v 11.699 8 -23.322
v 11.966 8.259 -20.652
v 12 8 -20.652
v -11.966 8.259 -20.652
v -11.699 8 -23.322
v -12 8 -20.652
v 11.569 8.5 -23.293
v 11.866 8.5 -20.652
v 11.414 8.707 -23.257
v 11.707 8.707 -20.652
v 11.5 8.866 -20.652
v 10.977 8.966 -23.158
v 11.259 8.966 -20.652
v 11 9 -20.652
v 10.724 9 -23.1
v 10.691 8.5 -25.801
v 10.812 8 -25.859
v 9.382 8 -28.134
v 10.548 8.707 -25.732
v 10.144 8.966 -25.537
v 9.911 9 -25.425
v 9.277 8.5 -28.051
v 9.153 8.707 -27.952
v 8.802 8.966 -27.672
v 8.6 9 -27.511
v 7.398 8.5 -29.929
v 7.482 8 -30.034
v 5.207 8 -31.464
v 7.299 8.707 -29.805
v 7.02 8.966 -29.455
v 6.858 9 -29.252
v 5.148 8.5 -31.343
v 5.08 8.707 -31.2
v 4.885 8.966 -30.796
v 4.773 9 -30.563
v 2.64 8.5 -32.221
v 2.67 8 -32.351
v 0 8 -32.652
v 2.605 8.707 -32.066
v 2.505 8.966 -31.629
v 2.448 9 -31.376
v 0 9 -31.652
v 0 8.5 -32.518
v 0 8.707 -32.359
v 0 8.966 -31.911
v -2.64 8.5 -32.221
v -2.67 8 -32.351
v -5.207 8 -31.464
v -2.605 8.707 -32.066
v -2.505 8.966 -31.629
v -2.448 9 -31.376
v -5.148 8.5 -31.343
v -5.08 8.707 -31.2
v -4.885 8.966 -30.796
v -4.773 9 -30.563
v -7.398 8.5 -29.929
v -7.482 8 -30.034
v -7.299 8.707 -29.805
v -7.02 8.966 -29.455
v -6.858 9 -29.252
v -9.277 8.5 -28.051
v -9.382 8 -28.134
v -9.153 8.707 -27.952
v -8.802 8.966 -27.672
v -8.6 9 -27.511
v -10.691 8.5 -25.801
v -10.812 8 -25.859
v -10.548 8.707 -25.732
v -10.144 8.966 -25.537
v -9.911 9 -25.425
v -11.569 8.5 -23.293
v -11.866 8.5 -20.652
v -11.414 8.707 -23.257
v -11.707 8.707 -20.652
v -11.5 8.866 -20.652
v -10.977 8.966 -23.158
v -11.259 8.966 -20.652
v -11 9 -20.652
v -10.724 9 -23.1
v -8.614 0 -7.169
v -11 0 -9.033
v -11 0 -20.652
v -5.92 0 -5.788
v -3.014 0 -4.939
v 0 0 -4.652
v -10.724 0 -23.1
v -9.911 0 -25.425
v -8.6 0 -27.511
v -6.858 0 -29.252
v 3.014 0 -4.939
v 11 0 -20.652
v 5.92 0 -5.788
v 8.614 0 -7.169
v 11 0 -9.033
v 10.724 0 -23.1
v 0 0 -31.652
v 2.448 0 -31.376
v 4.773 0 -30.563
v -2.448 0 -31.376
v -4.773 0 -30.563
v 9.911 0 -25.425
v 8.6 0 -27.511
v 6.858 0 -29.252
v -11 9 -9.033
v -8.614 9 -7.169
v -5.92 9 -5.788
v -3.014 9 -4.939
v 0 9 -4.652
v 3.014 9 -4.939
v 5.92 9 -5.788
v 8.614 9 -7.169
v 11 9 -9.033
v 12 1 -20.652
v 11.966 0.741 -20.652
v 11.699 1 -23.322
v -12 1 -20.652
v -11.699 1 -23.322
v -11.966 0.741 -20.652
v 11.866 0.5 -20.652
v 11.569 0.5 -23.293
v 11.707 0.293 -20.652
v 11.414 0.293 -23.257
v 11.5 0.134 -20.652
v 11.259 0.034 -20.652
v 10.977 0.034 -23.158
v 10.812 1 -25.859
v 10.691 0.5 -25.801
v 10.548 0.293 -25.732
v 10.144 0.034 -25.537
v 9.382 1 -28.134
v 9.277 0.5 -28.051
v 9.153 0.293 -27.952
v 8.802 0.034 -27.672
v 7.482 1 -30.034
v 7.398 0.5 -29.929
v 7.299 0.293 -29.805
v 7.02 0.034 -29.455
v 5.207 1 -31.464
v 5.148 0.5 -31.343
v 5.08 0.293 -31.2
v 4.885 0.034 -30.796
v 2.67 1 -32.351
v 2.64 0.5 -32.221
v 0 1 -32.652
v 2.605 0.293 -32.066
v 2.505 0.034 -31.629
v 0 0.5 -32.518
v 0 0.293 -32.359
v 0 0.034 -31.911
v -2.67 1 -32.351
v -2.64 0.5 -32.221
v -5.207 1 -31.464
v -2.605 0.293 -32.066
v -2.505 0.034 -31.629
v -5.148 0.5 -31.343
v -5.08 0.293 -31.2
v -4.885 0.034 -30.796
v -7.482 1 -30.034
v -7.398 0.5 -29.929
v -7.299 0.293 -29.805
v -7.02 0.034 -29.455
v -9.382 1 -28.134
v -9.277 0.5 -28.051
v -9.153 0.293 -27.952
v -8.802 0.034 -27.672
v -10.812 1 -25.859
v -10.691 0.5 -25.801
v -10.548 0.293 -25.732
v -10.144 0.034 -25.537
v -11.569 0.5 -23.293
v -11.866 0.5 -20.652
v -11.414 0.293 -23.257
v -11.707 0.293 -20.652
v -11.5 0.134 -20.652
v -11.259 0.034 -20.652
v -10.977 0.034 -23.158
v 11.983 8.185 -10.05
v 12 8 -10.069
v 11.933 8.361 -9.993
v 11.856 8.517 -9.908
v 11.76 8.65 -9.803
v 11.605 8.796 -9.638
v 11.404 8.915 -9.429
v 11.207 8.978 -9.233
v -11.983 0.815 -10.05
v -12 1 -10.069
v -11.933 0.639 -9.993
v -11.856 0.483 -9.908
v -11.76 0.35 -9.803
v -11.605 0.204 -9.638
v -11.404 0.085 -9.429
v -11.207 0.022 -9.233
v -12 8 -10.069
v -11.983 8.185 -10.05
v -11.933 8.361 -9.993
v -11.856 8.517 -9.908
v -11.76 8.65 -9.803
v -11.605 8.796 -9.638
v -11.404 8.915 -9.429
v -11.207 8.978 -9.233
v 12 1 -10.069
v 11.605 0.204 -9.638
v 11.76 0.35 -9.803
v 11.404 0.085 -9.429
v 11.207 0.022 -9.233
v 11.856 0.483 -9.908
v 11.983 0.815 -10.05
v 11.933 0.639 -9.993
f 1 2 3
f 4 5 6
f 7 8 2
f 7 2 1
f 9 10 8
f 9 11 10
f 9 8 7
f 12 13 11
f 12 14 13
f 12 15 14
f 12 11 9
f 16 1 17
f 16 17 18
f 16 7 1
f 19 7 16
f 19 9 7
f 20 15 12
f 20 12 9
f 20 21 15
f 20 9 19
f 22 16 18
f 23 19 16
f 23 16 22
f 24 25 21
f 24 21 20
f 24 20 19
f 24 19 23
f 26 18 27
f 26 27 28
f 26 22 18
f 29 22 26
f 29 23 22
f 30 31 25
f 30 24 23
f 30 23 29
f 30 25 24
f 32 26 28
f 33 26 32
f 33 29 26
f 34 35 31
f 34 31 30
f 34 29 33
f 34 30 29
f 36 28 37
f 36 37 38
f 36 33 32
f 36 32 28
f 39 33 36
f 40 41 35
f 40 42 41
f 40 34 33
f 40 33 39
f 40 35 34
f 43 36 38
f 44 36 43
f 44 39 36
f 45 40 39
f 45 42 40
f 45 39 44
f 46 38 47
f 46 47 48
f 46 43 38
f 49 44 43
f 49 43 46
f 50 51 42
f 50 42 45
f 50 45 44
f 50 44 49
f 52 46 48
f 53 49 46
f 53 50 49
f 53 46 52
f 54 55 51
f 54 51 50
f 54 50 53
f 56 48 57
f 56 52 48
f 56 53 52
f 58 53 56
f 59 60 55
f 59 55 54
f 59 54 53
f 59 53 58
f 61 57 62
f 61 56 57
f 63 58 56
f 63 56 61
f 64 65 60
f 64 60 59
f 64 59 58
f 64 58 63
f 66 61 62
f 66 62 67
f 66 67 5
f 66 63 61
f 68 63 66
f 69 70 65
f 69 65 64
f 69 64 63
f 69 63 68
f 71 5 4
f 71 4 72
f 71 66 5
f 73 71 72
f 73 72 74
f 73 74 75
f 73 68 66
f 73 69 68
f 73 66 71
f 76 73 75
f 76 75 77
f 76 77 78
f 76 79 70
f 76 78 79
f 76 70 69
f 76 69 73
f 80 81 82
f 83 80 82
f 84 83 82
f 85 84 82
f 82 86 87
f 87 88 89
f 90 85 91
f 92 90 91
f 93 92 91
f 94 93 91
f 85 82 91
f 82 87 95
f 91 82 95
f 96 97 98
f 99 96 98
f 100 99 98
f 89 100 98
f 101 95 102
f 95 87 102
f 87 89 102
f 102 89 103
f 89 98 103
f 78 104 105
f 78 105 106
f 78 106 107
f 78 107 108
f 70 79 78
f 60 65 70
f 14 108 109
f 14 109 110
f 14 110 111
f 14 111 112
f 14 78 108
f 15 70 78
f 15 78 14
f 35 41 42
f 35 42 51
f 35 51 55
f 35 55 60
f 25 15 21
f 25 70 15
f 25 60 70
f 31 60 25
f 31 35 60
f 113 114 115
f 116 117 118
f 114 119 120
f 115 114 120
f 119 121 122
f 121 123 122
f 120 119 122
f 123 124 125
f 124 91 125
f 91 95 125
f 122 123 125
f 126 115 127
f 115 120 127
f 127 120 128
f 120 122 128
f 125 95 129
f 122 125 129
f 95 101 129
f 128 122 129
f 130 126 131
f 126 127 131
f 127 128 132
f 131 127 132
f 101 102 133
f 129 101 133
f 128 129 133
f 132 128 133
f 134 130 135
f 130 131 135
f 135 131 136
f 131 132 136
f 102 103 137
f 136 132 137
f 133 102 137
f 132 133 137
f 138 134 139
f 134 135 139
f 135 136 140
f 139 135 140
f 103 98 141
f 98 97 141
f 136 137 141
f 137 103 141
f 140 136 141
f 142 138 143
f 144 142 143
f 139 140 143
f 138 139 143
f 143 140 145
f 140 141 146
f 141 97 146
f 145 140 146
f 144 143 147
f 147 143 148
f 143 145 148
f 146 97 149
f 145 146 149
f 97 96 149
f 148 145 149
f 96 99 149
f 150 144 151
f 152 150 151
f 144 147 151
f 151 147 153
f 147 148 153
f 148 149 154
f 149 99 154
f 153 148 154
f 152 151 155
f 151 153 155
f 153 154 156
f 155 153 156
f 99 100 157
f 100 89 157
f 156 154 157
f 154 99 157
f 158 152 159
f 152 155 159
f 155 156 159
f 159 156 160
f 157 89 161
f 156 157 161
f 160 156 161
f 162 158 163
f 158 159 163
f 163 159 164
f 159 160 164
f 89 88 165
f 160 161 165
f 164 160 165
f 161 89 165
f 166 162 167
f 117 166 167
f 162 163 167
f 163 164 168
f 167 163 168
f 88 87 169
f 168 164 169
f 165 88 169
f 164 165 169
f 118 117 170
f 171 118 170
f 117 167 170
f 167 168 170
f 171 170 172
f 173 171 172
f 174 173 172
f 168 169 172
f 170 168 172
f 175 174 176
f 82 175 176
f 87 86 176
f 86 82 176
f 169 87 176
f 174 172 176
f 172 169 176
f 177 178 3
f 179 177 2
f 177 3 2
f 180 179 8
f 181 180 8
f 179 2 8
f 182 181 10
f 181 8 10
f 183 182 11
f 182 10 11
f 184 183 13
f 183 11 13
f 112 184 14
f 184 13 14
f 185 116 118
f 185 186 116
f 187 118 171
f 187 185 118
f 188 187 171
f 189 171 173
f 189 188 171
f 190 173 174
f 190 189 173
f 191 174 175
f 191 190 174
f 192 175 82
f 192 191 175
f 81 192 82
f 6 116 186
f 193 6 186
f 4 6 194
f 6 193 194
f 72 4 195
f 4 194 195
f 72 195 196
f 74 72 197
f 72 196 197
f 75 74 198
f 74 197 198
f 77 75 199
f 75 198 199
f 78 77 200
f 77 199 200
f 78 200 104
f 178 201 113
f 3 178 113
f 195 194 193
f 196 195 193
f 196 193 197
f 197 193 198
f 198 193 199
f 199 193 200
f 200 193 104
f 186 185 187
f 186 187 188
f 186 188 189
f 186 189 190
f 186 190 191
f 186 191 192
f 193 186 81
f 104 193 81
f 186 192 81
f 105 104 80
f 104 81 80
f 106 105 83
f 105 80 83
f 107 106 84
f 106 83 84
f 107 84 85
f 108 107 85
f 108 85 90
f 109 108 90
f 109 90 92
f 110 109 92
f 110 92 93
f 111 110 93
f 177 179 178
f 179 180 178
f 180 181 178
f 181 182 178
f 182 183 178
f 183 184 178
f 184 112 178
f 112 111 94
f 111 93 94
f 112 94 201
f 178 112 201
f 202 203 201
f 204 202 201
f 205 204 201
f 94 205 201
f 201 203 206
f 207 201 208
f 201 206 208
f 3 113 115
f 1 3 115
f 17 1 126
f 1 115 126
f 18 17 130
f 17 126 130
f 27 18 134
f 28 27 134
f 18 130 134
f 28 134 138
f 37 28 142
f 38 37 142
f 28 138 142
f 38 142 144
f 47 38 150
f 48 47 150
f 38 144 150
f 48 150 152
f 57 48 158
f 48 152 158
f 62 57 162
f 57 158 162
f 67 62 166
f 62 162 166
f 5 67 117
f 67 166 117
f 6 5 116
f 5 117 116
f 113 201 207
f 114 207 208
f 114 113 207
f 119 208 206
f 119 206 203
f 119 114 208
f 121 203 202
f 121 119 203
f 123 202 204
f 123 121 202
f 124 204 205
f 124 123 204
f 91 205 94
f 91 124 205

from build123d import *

# Parameters (mm, degrees)
BOSS_EXTRUDE1_DEPTH = 9
FILLET1_R           = 1


with BuildPart() as part:
    # Sketch1 → Boss-Extrude1 (new body)
    with BuildSketch(Plane(origin=(0, 0, 0), x_dir=(1, 0, 0), z_dir=(0, 1, 0))):
        with BuildLine():
            Line((-12, 20.652247549), (-12, 10.069242304))
            ThreePointArc((-12, 10.069242304), (0, 4.652247549), (12, 10.069242304))
            Line((12, 10.069242304), (12, 20.652247549))
            ThreePointArc((12, 20.652247549), (0, 32.652247549), (-12, 20.652247549))
        make_face()
    extrude(amount=BOSS_EXTRUDE1_DEPTH)

    # Fillet1
    fillet1_edges = [part.edges().sort_by_distance(p)[0] for p in [
        (12, 9, -15.360744926),
        (0, 9, -32.652247549),
        (12, 0, -15.360744926),
        (-12, 0, -15.360744926),
        (0, 0, -32.652247549),
        (-12, 9, -15.360744926),
    ]]
    fillet(fillet1_edges, radius=FILLET1_R)


solid = part.part
